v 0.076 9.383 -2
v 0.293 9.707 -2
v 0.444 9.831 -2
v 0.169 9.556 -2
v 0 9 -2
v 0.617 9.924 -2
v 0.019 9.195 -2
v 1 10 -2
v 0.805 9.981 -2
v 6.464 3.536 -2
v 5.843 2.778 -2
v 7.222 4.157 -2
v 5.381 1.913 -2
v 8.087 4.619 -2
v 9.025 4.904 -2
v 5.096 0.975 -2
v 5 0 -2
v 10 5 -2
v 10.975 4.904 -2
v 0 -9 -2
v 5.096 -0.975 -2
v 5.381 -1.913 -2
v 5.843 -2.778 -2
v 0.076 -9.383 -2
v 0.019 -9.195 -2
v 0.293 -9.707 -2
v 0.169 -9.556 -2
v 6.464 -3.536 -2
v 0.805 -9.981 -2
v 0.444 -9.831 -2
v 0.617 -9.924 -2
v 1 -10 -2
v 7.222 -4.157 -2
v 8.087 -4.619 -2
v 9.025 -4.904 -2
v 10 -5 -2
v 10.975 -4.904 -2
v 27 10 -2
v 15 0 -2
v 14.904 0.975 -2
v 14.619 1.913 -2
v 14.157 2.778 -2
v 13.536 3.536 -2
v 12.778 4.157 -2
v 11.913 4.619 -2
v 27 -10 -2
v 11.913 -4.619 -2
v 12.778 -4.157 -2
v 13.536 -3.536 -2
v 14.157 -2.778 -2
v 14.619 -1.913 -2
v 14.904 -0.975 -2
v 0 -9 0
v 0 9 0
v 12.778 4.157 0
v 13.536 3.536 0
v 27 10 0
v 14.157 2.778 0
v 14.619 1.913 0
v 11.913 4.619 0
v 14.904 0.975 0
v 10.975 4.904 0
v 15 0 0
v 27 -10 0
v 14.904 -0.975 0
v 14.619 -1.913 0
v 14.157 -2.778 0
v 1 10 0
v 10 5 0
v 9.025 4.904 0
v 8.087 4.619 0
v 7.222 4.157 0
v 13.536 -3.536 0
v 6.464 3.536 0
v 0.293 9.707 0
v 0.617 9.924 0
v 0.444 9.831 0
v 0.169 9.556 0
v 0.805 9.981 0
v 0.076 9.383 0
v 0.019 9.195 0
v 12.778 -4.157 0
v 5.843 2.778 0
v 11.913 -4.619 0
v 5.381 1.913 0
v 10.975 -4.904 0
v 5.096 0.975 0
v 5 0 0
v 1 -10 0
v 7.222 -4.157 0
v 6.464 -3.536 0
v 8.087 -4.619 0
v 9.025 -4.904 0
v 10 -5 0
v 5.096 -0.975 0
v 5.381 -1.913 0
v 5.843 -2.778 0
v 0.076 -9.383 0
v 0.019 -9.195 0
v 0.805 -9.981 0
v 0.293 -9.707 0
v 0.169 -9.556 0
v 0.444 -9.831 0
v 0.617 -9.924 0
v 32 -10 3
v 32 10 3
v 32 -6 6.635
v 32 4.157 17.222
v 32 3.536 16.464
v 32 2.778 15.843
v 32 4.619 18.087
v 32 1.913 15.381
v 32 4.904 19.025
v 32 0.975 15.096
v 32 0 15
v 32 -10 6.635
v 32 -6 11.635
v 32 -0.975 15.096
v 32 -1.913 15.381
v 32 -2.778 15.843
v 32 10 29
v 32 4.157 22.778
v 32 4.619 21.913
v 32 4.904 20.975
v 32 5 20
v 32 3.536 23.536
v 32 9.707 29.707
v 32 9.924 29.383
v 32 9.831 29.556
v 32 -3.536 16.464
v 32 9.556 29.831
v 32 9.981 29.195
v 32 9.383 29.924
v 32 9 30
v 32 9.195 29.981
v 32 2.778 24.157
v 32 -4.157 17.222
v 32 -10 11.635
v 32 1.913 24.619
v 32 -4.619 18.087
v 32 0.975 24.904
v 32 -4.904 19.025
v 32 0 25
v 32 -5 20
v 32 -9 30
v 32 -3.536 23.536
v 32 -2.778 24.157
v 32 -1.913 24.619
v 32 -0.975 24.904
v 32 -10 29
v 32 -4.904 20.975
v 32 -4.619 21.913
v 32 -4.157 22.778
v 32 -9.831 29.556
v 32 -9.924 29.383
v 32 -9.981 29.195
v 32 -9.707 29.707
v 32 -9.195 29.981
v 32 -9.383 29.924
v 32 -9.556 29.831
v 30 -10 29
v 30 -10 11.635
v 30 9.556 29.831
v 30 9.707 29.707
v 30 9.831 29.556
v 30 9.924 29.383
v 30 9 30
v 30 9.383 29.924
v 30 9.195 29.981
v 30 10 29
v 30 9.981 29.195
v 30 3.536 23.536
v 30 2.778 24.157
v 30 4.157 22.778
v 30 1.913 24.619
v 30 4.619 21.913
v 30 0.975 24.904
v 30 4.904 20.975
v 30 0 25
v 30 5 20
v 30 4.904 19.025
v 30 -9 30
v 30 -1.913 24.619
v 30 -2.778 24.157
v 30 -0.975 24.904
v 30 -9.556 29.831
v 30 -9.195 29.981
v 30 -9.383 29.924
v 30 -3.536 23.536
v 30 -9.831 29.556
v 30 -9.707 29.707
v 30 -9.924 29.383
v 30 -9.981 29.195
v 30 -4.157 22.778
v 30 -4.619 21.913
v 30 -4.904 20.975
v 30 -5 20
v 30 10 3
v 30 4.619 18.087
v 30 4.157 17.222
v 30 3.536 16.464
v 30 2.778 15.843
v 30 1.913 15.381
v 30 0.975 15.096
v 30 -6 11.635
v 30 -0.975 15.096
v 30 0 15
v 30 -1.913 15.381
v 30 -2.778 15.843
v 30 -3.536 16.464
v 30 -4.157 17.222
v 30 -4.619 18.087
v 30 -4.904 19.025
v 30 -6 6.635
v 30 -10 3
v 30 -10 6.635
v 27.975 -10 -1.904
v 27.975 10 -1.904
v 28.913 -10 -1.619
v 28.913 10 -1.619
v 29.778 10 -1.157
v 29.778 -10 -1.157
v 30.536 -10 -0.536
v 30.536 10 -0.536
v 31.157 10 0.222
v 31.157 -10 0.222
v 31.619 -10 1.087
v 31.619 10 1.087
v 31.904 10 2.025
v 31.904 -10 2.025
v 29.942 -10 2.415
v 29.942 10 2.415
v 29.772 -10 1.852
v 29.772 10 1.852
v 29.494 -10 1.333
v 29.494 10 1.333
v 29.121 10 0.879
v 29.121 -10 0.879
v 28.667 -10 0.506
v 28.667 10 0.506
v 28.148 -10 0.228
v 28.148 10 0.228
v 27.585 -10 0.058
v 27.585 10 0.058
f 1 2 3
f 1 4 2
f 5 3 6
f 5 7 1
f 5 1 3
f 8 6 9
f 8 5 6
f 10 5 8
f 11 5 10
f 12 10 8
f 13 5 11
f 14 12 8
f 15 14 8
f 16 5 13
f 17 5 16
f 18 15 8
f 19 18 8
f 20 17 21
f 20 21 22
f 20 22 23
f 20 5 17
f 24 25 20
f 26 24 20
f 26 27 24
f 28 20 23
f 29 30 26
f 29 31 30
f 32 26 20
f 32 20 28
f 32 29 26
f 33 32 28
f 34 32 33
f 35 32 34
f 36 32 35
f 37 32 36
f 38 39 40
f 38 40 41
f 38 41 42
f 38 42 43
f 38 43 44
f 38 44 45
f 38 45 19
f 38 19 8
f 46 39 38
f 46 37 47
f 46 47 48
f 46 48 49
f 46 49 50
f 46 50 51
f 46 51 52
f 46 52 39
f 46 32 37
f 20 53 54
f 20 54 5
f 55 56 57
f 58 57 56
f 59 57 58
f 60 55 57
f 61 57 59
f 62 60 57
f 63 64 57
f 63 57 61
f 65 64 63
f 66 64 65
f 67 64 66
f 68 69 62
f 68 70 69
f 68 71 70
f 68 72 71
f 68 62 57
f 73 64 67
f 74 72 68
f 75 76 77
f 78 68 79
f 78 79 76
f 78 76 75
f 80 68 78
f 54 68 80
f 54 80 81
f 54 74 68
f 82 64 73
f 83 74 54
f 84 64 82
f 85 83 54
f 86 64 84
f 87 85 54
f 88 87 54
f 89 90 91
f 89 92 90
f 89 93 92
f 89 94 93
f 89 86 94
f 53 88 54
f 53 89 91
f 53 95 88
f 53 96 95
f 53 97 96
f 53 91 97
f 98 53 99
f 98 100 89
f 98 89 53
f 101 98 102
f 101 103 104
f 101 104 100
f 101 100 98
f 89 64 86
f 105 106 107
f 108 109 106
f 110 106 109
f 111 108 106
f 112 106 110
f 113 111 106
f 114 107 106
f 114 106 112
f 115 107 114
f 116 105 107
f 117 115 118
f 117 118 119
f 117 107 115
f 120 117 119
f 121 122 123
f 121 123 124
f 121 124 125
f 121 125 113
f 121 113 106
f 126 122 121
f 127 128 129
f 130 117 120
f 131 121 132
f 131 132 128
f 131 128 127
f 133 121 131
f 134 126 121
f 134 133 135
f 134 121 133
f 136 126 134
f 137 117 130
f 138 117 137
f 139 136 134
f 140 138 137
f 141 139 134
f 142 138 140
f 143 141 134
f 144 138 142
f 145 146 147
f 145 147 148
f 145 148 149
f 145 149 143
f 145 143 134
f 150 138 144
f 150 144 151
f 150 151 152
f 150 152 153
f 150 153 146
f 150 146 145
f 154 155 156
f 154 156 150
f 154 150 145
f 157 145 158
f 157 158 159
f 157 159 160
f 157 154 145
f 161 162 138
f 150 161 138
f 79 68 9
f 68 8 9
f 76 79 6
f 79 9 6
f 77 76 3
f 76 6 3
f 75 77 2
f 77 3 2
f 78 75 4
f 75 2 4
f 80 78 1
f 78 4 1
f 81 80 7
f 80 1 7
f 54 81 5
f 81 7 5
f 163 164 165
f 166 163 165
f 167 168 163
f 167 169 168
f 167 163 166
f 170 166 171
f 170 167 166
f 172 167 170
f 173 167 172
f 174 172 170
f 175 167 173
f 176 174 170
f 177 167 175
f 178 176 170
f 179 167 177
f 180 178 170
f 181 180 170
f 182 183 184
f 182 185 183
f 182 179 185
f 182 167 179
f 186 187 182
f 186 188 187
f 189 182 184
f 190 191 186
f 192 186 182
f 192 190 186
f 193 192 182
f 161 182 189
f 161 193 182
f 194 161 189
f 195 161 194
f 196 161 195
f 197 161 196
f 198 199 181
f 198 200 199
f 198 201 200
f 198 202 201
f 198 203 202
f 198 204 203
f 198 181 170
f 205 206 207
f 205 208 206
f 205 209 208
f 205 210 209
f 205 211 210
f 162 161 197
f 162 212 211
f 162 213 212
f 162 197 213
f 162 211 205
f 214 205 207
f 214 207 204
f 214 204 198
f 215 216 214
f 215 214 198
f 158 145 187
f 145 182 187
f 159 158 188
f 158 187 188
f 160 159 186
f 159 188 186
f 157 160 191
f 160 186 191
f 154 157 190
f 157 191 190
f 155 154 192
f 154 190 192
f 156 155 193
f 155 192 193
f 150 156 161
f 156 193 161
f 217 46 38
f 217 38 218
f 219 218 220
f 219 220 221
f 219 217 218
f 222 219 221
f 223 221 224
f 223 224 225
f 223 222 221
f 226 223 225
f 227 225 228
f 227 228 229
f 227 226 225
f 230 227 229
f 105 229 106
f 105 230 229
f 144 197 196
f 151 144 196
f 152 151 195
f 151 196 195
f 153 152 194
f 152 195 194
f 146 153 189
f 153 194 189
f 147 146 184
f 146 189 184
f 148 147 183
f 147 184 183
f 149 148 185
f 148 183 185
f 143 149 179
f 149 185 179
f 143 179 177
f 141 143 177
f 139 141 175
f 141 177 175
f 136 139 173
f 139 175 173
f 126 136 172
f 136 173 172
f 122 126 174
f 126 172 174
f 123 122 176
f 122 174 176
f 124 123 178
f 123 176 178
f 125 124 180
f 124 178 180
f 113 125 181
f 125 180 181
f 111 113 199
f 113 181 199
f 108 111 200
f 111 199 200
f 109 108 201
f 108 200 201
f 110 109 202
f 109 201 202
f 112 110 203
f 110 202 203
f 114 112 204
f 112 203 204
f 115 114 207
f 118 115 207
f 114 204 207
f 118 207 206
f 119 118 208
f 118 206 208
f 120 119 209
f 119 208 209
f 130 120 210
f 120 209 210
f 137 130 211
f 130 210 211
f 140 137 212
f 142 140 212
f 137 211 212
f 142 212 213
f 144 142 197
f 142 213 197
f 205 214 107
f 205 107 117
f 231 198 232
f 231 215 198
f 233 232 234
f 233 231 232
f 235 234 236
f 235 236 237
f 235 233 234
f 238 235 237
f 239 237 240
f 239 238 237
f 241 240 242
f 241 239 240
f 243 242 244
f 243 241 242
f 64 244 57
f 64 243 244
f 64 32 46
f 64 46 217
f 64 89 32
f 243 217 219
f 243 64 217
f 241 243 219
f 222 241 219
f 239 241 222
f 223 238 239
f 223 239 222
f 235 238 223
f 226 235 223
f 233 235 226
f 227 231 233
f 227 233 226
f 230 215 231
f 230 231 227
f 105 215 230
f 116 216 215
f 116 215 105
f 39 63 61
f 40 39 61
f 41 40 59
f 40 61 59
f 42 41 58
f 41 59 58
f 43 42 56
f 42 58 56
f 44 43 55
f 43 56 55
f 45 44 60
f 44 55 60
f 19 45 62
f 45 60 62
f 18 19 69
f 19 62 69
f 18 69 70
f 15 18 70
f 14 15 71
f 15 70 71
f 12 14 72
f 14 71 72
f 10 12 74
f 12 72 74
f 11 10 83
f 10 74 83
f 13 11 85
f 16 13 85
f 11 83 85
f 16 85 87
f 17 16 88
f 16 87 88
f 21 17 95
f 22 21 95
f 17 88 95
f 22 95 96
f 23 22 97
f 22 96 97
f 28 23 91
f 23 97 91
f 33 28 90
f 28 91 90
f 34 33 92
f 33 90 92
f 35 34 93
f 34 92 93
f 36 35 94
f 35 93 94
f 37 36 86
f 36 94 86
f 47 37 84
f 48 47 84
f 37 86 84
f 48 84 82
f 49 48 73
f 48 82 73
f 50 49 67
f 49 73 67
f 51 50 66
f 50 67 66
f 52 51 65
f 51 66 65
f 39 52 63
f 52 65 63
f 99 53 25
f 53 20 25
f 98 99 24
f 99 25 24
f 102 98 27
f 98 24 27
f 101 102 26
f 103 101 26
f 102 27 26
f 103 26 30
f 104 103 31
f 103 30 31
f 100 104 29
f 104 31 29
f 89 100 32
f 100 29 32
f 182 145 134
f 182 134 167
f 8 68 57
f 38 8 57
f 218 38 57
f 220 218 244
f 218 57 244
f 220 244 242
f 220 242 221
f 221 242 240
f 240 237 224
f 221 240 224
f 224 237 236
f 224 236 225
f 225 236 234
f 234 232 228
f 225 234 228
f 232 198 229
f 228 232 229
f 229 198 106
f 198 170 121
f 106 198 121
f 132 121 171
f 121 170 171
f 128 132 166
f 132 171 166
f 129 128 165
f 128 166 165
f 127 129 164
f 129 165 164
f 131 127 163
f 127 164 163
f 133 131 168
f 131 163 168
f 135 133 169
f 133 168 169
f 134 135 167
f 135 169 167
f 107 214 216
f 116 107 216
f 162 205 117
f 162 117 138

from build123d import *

# Parameters (mm, degrees)
F1_DEPTH = 10
F2_R     = 5
F3_DEPTH = 2
F4_W     = 4
F4_H     = 5
F5_DEPTH = 2
F6_R     = 5
F7_DEPTH = 2
F8_R     = 1


with BuildPart() as f1:
    # F0 (on Front) → F1 (new body, symmetric)
    with BuildSketch(Plane.XZ):
        with BuildLine():
            Line((27, 0), (0, 0))
            Line((0, 0), (0, -2))
            Line((0, -2), (27, -2))
            ThreePointArc((27, -2), (30.535534, -0.535534), (32, 3))
            Line((32, 3), (32, 30))
            Line((32, 30), (30, 30))
            Line((30, 30), (30, 3))
            ThreePointArc((30, 3), (29.12132, 0.87868), (27, 0))
        make_face()
    extrude(amount=F1_DEPTH, both=True)

    # F2 (on face) → F3 (cut, through all)
    with BuildSketch(Plane(origin=(30, 0, 0), x_dir=(0, -1, 0), z_dir=(-1, 0, 0))):
        with Locations((0, 20)):
            Circle(F2_R)
    extrude(amount=-F3_DEPTH, mode=Mode.SUBTRACT)

    # F4 (on face) → F5 (cut, through all)
    with BuildSketch(Plane(origin=(30, 0, 0), x_dir=(0, -1, 0), z_dir=(-1, 0, 0))):
        with Locations((8, 9.134532)):
            Rectangle(F4_W, F4_H)
    extrude(amount=-F5_DEPTH, mode=Mode.SUBTRACT)

    # F6 (on face) → F7 (cut, through all)
    with BuildSketch(Plane.XY):
        with Locations((10, 0)):
            Circle(F6_R)
    extrude(amount=-F7_DEPTH, mode=Mode.SUBTRACT)

    # F8
    f8_edges = [f1.edges().sort_by_distance(p)[0] for p in [
        (31, 10, 30),
        (31, -10, 30),
        (0, 10, -1),
        (0, -10, -1),
    ]]
    fillet(f8_edges, radius=F8_R)


solid = f1.part
